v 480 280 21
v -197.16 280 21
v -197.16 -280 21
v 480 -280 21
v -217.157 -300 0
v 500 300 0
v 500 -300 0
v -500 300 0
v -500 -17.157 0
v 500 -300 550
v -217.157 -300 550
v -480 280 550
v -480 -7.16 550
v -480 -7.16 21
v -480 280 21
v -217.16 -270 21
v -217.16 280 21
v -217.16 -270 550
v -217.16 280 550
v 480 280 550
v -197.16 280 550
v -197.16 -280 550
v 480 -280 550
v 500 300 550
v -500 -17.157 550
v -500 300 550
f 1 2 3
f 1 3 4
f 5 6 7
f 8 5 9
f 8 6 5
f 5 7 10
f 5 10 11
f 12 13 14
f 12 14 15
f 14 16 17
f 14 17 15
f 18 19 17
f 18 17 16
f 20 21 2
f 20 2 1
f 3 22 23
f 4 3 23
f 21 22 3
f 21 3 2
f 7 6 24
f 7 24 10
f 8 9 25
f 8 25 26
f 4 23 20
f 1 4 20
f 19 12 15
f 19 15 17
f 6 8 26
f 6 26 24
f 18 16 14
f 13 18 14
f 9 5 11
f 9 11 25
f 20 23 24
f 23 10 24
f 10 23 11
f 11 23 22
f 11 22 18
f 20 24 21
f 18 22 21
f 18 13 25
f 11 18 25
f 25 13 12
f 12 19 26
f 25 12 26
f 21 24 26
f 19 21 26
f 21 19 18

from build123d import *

# Parameters (mm, degrees)
PAD_DEPTH    = 550
SKETCH001_W  = 677.16
SKETCH001_H  = 560
POCKET_DEPTH = 530


with BuildPart() as part:
    # Sketch → Pad (new body)
    with BuildSketch(Plane.XY):
        Polygon((-500, 300), (500, 300), (500, -300), (-217.157288, -300), (-500, -17.157288), align=None)
    extrude(amount=PAD_DEPTH)

    # Sketch001 → Pocket (cut)
    with BuildSketch(Plane.XY.offset(551)):
        with Locations((141.42, 0)):
            Rectangle(SKETCH001_W, SKETCH001_H)
        Polygon((-480, 280), (-217.16, 280), (-217.16, -270), (-480, -7.16), align=None)
    extrude(amount=-POCKET_DEPTH, mode=Mode.SUBTRACT)


solid = part.part
